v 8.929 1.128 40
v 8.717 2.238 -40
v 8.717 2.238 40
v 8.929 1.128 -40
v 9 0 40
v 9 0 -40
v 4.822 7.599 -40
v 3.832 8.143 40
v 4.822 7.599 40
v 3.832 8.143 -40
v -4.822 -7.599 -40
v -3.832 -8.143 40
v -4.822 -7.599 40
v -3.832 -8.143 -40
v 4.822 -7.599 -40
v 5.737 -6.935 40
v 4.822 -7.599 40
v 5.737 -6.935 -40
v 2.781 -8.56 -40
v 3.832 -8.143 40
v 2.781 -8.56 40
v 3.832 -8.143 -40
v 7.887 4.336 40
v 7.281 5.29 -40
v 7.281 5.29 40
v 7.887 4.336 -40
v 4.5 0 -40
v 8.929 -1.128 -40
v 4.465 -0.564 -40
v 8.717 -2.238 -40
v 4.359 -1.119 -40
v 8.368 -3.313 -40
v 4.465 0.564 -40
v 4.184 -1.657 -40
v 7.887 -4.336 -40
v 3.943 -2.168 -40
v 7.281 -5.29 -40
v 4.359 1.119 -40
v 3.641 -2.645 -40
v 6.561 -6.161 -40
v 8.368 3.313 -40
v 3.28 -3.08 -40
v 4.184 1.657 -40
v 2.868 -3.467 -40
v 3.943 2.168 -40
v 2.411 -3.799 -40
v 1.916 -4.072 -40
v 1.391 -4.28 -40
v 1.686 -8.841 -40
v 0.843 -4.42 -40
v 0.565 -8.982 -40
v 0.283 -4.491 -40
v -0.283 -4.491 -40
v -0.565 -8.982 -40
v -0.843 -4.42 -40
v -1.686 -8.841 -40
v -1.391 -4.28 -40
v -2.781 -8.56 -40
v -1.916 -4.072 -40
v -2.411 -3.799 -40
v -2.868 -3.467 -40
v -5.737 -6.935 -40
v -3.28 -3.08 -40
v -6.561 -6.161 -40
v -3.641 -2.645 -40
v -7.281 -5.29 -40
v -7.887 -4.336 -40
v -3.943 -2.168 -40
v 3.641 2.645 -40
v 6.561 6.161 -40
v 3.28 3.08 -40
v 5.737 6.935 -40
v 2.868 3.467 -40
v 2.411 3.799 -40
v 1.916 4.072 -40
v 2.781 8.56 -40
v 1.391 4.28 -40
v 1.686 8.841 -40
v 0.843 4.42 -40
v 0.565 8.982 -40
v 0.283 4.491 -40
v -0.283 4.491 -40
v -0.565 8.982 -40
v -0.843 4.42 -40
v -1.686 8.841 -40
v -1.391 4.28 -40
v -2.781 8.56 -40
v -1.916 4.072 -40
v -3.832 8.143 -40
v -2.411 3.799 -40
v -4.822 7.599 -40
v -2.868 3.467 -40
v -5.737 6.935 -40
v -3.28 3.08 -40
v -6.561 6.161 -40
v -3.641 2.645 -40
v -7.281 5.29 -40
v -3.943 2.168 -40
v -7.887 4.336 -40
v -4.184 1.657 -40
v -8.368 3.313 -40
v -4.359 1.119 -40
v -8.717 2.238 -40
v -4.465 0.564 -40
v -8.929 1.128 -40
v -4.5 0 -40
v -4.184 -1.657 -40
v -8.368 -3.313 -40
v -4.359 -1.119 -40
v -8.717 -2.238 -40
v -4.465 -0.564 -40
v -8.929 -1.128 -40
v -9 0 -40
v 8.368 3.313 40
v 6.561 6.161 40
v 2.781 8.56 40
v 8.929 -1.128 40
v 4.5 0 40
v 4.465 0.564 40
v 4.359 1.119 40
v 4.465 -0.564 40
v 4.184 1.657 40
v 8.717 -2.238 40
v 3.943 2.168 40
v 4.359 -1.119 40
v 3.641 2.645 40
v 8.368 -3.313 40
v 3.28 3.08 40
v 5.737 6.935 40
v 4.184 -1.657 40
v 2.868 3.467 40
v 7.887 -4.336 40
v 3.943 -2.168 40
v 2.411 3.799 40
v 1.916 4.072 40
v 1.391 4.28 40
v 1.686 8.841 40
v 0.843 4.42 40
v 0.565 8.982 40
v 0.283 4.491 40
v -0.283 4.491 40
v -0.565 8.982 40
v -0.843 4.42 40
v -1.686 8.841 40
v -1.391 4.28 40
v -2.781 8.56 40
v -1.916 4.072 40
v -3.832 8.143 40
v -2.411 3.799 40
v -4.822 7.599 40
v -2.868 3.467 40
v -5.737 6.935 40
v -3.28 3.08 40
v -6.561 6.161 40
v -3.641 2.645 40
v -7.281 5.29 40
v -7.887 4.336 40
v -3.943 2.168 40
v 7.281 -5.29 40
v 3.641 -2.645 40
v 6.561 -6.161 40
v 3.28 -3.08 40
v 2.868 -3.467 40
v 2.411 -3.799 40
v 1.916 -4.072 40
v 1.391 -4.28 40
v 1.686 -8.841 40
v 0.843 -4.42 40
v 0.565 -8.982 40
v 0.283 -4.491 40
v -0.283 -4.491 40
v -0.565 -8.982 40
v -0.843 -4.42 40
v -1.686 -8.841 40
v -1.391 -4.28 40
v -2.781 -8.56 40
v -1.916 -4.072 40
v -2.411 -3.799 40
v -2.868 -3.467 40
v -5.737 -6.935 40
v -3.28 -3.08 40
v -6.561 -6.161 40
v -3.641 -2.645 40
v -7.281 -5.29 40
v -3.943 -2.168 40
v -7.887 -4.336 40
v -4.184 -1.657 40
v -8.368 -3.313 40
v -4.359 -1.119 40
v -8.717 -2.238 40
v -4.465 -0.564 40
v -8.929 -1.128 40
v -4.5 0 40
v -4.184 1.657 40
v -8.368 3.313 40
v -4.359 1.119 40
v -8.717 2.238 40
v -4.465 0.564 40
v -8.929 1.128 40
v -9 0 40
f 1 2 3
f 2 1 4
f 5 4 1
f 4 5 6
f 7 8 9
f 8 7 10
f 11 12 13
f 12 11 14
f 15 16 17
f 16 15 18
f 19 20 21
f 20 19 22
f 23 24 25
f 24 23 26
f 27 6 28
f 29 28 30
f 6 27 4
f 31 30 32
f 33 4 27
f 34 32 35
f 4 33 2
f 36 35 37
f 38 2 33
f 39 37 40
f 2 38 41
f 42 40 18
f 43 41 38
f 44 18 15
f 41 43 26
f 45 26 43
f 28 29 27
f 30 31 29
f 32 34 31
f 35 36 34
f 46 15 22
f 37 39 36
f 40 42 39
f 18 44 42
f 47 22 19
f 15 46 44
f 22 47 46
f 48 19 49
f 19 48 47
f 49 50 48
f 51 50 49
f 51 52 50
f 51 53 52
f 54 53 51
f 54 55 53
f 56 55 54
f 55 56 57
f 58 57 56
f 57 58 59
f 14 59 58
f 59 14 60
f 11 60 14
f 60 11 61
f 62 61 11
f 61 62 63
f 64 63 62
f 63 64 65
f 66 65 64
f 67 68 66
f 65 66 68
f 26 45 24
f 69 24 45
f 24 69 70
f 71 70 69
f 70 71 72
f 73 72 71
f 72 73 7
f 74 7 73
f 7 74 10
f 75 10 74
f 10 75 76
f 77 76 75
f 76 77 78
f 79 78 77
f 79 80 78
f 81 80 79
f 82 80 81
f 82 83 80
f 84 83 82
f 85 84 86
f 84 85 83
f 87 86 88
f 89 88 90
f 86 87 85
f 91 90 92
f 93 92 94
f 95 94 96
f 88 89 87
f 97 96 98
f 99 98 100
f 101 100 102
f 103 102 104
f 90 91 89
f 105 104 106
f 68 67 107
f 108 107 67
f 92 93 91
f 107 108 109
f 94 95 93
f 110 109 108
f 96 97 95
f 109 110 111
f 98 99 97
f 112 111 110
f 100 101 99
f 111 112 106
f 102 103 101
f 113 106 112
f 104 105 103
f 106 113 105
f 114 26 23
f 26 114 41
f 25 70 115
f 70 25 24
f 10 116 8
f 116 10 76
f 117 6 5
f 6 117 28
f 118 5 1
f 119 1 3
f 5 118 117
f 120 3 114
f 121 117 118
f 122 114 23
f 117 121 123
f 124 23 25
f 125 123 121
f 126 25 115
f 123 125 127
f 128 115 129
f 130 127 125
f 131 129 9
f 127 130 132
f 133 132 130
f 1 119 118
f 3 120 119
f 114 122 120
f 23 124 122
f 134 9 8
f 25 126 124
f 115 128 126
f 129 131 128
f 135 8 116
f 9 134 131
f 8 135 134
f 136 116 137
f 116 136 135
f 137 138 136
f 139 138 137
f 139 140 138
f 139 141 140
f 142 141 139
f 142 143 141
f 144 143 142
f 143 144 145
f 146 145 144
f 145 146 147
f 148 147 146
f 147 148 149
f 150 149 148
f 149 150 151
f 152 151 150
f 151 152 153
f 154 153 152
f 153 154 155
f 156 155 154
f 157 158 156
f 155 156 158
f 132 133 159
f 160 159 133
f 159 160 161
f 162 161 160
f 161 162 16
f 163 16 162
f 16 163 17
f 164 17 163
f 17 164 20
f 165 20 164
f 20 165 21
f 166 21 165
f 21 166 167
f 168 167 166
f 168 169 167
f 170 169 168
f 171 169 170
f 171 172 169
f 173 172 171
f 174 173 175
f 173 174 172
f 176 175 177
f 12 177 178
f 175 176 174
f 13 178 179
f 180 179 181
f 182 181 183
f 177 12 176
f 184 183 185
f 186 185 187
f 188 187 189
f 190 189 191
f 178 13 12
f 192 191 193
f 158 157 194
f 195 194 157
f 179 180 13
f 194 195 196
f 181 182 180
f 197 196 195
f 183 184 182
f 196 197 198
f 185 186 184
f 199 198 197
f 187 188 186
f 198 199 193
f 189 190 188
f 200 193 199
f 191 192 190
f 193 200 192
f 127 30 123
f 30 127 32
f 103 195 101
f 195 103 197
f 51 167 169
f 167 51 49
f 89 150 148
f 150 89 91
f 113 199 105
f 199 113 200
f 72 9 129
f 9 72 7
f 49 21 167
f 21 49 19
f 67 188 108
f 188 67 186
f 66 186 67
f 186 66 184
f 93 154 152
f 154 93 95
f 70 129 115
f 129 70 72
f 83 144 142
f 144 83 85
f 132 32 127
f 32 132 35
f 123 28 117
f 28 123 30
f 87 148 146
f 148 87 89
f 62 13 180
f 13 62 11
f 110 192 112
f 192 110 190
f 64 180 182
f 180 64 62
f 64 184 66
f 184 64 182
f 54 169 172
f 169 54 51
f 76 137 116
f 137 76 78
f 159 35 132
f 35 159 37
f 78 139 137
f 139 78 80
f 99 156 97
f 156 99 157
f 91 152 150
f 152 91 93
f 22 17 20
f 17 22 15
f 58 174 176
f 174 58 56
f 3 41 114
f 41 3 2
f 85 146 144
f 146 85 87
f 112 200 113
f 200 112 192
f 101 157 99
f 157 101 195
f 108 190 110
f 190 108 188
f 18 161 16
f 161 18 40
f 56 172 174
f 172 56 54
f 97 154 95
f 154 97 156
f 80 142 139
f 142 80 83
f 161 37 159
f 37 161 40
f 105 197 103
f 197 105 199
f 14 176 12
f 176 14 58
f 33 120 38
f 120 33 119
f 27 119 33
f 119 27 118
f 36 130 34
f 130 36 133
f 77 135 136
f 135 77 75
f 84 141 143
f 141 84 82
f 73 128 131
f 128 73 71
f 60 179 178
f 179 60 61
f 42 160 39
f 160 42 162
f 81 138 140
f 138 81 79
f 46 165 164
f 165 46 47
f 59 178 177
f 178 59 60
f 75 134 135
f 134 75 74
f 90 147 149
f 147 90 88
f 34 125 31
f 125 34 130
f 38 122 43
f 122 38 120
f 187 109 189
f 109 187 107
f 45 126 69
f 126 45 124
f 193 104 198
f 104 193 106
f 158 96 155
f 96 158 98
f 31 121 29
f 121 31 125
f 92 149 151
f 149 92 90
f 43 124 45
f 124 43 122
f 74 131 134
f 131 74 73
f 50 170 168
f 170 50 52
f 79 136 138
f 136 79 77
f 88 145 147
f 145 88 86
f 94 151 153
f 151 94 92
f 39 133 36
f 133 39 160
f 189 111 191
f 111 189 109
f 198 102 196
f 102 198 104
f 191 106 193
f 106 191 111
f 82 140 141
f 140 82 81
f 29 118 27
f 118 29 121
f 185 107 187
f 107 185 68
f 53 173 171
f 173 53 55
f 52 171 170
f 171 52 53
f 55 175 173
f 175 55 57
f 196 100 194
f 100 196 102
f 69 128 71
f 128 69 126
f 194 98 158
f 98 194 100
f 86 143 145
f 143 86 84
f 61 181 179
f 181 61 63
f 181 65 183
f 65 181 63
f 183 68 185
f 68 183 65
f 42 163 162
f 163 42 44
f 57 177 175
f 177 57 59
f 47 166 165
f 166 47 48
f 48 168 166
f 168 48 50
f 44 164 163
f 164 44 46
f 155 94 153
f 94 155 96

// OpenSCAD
$fn = 50;


difference() {
	union() {
		translate(v = [0, 0, -40.0000000000]) {
			cylinder(h = 80, r = 9.0000000000);
		}
	}
	union() {
		translate(v = [0, 0, -100.0000000000]) {
			cylinder(h = 200, r = 4.5000000000);
		}
	}
}
